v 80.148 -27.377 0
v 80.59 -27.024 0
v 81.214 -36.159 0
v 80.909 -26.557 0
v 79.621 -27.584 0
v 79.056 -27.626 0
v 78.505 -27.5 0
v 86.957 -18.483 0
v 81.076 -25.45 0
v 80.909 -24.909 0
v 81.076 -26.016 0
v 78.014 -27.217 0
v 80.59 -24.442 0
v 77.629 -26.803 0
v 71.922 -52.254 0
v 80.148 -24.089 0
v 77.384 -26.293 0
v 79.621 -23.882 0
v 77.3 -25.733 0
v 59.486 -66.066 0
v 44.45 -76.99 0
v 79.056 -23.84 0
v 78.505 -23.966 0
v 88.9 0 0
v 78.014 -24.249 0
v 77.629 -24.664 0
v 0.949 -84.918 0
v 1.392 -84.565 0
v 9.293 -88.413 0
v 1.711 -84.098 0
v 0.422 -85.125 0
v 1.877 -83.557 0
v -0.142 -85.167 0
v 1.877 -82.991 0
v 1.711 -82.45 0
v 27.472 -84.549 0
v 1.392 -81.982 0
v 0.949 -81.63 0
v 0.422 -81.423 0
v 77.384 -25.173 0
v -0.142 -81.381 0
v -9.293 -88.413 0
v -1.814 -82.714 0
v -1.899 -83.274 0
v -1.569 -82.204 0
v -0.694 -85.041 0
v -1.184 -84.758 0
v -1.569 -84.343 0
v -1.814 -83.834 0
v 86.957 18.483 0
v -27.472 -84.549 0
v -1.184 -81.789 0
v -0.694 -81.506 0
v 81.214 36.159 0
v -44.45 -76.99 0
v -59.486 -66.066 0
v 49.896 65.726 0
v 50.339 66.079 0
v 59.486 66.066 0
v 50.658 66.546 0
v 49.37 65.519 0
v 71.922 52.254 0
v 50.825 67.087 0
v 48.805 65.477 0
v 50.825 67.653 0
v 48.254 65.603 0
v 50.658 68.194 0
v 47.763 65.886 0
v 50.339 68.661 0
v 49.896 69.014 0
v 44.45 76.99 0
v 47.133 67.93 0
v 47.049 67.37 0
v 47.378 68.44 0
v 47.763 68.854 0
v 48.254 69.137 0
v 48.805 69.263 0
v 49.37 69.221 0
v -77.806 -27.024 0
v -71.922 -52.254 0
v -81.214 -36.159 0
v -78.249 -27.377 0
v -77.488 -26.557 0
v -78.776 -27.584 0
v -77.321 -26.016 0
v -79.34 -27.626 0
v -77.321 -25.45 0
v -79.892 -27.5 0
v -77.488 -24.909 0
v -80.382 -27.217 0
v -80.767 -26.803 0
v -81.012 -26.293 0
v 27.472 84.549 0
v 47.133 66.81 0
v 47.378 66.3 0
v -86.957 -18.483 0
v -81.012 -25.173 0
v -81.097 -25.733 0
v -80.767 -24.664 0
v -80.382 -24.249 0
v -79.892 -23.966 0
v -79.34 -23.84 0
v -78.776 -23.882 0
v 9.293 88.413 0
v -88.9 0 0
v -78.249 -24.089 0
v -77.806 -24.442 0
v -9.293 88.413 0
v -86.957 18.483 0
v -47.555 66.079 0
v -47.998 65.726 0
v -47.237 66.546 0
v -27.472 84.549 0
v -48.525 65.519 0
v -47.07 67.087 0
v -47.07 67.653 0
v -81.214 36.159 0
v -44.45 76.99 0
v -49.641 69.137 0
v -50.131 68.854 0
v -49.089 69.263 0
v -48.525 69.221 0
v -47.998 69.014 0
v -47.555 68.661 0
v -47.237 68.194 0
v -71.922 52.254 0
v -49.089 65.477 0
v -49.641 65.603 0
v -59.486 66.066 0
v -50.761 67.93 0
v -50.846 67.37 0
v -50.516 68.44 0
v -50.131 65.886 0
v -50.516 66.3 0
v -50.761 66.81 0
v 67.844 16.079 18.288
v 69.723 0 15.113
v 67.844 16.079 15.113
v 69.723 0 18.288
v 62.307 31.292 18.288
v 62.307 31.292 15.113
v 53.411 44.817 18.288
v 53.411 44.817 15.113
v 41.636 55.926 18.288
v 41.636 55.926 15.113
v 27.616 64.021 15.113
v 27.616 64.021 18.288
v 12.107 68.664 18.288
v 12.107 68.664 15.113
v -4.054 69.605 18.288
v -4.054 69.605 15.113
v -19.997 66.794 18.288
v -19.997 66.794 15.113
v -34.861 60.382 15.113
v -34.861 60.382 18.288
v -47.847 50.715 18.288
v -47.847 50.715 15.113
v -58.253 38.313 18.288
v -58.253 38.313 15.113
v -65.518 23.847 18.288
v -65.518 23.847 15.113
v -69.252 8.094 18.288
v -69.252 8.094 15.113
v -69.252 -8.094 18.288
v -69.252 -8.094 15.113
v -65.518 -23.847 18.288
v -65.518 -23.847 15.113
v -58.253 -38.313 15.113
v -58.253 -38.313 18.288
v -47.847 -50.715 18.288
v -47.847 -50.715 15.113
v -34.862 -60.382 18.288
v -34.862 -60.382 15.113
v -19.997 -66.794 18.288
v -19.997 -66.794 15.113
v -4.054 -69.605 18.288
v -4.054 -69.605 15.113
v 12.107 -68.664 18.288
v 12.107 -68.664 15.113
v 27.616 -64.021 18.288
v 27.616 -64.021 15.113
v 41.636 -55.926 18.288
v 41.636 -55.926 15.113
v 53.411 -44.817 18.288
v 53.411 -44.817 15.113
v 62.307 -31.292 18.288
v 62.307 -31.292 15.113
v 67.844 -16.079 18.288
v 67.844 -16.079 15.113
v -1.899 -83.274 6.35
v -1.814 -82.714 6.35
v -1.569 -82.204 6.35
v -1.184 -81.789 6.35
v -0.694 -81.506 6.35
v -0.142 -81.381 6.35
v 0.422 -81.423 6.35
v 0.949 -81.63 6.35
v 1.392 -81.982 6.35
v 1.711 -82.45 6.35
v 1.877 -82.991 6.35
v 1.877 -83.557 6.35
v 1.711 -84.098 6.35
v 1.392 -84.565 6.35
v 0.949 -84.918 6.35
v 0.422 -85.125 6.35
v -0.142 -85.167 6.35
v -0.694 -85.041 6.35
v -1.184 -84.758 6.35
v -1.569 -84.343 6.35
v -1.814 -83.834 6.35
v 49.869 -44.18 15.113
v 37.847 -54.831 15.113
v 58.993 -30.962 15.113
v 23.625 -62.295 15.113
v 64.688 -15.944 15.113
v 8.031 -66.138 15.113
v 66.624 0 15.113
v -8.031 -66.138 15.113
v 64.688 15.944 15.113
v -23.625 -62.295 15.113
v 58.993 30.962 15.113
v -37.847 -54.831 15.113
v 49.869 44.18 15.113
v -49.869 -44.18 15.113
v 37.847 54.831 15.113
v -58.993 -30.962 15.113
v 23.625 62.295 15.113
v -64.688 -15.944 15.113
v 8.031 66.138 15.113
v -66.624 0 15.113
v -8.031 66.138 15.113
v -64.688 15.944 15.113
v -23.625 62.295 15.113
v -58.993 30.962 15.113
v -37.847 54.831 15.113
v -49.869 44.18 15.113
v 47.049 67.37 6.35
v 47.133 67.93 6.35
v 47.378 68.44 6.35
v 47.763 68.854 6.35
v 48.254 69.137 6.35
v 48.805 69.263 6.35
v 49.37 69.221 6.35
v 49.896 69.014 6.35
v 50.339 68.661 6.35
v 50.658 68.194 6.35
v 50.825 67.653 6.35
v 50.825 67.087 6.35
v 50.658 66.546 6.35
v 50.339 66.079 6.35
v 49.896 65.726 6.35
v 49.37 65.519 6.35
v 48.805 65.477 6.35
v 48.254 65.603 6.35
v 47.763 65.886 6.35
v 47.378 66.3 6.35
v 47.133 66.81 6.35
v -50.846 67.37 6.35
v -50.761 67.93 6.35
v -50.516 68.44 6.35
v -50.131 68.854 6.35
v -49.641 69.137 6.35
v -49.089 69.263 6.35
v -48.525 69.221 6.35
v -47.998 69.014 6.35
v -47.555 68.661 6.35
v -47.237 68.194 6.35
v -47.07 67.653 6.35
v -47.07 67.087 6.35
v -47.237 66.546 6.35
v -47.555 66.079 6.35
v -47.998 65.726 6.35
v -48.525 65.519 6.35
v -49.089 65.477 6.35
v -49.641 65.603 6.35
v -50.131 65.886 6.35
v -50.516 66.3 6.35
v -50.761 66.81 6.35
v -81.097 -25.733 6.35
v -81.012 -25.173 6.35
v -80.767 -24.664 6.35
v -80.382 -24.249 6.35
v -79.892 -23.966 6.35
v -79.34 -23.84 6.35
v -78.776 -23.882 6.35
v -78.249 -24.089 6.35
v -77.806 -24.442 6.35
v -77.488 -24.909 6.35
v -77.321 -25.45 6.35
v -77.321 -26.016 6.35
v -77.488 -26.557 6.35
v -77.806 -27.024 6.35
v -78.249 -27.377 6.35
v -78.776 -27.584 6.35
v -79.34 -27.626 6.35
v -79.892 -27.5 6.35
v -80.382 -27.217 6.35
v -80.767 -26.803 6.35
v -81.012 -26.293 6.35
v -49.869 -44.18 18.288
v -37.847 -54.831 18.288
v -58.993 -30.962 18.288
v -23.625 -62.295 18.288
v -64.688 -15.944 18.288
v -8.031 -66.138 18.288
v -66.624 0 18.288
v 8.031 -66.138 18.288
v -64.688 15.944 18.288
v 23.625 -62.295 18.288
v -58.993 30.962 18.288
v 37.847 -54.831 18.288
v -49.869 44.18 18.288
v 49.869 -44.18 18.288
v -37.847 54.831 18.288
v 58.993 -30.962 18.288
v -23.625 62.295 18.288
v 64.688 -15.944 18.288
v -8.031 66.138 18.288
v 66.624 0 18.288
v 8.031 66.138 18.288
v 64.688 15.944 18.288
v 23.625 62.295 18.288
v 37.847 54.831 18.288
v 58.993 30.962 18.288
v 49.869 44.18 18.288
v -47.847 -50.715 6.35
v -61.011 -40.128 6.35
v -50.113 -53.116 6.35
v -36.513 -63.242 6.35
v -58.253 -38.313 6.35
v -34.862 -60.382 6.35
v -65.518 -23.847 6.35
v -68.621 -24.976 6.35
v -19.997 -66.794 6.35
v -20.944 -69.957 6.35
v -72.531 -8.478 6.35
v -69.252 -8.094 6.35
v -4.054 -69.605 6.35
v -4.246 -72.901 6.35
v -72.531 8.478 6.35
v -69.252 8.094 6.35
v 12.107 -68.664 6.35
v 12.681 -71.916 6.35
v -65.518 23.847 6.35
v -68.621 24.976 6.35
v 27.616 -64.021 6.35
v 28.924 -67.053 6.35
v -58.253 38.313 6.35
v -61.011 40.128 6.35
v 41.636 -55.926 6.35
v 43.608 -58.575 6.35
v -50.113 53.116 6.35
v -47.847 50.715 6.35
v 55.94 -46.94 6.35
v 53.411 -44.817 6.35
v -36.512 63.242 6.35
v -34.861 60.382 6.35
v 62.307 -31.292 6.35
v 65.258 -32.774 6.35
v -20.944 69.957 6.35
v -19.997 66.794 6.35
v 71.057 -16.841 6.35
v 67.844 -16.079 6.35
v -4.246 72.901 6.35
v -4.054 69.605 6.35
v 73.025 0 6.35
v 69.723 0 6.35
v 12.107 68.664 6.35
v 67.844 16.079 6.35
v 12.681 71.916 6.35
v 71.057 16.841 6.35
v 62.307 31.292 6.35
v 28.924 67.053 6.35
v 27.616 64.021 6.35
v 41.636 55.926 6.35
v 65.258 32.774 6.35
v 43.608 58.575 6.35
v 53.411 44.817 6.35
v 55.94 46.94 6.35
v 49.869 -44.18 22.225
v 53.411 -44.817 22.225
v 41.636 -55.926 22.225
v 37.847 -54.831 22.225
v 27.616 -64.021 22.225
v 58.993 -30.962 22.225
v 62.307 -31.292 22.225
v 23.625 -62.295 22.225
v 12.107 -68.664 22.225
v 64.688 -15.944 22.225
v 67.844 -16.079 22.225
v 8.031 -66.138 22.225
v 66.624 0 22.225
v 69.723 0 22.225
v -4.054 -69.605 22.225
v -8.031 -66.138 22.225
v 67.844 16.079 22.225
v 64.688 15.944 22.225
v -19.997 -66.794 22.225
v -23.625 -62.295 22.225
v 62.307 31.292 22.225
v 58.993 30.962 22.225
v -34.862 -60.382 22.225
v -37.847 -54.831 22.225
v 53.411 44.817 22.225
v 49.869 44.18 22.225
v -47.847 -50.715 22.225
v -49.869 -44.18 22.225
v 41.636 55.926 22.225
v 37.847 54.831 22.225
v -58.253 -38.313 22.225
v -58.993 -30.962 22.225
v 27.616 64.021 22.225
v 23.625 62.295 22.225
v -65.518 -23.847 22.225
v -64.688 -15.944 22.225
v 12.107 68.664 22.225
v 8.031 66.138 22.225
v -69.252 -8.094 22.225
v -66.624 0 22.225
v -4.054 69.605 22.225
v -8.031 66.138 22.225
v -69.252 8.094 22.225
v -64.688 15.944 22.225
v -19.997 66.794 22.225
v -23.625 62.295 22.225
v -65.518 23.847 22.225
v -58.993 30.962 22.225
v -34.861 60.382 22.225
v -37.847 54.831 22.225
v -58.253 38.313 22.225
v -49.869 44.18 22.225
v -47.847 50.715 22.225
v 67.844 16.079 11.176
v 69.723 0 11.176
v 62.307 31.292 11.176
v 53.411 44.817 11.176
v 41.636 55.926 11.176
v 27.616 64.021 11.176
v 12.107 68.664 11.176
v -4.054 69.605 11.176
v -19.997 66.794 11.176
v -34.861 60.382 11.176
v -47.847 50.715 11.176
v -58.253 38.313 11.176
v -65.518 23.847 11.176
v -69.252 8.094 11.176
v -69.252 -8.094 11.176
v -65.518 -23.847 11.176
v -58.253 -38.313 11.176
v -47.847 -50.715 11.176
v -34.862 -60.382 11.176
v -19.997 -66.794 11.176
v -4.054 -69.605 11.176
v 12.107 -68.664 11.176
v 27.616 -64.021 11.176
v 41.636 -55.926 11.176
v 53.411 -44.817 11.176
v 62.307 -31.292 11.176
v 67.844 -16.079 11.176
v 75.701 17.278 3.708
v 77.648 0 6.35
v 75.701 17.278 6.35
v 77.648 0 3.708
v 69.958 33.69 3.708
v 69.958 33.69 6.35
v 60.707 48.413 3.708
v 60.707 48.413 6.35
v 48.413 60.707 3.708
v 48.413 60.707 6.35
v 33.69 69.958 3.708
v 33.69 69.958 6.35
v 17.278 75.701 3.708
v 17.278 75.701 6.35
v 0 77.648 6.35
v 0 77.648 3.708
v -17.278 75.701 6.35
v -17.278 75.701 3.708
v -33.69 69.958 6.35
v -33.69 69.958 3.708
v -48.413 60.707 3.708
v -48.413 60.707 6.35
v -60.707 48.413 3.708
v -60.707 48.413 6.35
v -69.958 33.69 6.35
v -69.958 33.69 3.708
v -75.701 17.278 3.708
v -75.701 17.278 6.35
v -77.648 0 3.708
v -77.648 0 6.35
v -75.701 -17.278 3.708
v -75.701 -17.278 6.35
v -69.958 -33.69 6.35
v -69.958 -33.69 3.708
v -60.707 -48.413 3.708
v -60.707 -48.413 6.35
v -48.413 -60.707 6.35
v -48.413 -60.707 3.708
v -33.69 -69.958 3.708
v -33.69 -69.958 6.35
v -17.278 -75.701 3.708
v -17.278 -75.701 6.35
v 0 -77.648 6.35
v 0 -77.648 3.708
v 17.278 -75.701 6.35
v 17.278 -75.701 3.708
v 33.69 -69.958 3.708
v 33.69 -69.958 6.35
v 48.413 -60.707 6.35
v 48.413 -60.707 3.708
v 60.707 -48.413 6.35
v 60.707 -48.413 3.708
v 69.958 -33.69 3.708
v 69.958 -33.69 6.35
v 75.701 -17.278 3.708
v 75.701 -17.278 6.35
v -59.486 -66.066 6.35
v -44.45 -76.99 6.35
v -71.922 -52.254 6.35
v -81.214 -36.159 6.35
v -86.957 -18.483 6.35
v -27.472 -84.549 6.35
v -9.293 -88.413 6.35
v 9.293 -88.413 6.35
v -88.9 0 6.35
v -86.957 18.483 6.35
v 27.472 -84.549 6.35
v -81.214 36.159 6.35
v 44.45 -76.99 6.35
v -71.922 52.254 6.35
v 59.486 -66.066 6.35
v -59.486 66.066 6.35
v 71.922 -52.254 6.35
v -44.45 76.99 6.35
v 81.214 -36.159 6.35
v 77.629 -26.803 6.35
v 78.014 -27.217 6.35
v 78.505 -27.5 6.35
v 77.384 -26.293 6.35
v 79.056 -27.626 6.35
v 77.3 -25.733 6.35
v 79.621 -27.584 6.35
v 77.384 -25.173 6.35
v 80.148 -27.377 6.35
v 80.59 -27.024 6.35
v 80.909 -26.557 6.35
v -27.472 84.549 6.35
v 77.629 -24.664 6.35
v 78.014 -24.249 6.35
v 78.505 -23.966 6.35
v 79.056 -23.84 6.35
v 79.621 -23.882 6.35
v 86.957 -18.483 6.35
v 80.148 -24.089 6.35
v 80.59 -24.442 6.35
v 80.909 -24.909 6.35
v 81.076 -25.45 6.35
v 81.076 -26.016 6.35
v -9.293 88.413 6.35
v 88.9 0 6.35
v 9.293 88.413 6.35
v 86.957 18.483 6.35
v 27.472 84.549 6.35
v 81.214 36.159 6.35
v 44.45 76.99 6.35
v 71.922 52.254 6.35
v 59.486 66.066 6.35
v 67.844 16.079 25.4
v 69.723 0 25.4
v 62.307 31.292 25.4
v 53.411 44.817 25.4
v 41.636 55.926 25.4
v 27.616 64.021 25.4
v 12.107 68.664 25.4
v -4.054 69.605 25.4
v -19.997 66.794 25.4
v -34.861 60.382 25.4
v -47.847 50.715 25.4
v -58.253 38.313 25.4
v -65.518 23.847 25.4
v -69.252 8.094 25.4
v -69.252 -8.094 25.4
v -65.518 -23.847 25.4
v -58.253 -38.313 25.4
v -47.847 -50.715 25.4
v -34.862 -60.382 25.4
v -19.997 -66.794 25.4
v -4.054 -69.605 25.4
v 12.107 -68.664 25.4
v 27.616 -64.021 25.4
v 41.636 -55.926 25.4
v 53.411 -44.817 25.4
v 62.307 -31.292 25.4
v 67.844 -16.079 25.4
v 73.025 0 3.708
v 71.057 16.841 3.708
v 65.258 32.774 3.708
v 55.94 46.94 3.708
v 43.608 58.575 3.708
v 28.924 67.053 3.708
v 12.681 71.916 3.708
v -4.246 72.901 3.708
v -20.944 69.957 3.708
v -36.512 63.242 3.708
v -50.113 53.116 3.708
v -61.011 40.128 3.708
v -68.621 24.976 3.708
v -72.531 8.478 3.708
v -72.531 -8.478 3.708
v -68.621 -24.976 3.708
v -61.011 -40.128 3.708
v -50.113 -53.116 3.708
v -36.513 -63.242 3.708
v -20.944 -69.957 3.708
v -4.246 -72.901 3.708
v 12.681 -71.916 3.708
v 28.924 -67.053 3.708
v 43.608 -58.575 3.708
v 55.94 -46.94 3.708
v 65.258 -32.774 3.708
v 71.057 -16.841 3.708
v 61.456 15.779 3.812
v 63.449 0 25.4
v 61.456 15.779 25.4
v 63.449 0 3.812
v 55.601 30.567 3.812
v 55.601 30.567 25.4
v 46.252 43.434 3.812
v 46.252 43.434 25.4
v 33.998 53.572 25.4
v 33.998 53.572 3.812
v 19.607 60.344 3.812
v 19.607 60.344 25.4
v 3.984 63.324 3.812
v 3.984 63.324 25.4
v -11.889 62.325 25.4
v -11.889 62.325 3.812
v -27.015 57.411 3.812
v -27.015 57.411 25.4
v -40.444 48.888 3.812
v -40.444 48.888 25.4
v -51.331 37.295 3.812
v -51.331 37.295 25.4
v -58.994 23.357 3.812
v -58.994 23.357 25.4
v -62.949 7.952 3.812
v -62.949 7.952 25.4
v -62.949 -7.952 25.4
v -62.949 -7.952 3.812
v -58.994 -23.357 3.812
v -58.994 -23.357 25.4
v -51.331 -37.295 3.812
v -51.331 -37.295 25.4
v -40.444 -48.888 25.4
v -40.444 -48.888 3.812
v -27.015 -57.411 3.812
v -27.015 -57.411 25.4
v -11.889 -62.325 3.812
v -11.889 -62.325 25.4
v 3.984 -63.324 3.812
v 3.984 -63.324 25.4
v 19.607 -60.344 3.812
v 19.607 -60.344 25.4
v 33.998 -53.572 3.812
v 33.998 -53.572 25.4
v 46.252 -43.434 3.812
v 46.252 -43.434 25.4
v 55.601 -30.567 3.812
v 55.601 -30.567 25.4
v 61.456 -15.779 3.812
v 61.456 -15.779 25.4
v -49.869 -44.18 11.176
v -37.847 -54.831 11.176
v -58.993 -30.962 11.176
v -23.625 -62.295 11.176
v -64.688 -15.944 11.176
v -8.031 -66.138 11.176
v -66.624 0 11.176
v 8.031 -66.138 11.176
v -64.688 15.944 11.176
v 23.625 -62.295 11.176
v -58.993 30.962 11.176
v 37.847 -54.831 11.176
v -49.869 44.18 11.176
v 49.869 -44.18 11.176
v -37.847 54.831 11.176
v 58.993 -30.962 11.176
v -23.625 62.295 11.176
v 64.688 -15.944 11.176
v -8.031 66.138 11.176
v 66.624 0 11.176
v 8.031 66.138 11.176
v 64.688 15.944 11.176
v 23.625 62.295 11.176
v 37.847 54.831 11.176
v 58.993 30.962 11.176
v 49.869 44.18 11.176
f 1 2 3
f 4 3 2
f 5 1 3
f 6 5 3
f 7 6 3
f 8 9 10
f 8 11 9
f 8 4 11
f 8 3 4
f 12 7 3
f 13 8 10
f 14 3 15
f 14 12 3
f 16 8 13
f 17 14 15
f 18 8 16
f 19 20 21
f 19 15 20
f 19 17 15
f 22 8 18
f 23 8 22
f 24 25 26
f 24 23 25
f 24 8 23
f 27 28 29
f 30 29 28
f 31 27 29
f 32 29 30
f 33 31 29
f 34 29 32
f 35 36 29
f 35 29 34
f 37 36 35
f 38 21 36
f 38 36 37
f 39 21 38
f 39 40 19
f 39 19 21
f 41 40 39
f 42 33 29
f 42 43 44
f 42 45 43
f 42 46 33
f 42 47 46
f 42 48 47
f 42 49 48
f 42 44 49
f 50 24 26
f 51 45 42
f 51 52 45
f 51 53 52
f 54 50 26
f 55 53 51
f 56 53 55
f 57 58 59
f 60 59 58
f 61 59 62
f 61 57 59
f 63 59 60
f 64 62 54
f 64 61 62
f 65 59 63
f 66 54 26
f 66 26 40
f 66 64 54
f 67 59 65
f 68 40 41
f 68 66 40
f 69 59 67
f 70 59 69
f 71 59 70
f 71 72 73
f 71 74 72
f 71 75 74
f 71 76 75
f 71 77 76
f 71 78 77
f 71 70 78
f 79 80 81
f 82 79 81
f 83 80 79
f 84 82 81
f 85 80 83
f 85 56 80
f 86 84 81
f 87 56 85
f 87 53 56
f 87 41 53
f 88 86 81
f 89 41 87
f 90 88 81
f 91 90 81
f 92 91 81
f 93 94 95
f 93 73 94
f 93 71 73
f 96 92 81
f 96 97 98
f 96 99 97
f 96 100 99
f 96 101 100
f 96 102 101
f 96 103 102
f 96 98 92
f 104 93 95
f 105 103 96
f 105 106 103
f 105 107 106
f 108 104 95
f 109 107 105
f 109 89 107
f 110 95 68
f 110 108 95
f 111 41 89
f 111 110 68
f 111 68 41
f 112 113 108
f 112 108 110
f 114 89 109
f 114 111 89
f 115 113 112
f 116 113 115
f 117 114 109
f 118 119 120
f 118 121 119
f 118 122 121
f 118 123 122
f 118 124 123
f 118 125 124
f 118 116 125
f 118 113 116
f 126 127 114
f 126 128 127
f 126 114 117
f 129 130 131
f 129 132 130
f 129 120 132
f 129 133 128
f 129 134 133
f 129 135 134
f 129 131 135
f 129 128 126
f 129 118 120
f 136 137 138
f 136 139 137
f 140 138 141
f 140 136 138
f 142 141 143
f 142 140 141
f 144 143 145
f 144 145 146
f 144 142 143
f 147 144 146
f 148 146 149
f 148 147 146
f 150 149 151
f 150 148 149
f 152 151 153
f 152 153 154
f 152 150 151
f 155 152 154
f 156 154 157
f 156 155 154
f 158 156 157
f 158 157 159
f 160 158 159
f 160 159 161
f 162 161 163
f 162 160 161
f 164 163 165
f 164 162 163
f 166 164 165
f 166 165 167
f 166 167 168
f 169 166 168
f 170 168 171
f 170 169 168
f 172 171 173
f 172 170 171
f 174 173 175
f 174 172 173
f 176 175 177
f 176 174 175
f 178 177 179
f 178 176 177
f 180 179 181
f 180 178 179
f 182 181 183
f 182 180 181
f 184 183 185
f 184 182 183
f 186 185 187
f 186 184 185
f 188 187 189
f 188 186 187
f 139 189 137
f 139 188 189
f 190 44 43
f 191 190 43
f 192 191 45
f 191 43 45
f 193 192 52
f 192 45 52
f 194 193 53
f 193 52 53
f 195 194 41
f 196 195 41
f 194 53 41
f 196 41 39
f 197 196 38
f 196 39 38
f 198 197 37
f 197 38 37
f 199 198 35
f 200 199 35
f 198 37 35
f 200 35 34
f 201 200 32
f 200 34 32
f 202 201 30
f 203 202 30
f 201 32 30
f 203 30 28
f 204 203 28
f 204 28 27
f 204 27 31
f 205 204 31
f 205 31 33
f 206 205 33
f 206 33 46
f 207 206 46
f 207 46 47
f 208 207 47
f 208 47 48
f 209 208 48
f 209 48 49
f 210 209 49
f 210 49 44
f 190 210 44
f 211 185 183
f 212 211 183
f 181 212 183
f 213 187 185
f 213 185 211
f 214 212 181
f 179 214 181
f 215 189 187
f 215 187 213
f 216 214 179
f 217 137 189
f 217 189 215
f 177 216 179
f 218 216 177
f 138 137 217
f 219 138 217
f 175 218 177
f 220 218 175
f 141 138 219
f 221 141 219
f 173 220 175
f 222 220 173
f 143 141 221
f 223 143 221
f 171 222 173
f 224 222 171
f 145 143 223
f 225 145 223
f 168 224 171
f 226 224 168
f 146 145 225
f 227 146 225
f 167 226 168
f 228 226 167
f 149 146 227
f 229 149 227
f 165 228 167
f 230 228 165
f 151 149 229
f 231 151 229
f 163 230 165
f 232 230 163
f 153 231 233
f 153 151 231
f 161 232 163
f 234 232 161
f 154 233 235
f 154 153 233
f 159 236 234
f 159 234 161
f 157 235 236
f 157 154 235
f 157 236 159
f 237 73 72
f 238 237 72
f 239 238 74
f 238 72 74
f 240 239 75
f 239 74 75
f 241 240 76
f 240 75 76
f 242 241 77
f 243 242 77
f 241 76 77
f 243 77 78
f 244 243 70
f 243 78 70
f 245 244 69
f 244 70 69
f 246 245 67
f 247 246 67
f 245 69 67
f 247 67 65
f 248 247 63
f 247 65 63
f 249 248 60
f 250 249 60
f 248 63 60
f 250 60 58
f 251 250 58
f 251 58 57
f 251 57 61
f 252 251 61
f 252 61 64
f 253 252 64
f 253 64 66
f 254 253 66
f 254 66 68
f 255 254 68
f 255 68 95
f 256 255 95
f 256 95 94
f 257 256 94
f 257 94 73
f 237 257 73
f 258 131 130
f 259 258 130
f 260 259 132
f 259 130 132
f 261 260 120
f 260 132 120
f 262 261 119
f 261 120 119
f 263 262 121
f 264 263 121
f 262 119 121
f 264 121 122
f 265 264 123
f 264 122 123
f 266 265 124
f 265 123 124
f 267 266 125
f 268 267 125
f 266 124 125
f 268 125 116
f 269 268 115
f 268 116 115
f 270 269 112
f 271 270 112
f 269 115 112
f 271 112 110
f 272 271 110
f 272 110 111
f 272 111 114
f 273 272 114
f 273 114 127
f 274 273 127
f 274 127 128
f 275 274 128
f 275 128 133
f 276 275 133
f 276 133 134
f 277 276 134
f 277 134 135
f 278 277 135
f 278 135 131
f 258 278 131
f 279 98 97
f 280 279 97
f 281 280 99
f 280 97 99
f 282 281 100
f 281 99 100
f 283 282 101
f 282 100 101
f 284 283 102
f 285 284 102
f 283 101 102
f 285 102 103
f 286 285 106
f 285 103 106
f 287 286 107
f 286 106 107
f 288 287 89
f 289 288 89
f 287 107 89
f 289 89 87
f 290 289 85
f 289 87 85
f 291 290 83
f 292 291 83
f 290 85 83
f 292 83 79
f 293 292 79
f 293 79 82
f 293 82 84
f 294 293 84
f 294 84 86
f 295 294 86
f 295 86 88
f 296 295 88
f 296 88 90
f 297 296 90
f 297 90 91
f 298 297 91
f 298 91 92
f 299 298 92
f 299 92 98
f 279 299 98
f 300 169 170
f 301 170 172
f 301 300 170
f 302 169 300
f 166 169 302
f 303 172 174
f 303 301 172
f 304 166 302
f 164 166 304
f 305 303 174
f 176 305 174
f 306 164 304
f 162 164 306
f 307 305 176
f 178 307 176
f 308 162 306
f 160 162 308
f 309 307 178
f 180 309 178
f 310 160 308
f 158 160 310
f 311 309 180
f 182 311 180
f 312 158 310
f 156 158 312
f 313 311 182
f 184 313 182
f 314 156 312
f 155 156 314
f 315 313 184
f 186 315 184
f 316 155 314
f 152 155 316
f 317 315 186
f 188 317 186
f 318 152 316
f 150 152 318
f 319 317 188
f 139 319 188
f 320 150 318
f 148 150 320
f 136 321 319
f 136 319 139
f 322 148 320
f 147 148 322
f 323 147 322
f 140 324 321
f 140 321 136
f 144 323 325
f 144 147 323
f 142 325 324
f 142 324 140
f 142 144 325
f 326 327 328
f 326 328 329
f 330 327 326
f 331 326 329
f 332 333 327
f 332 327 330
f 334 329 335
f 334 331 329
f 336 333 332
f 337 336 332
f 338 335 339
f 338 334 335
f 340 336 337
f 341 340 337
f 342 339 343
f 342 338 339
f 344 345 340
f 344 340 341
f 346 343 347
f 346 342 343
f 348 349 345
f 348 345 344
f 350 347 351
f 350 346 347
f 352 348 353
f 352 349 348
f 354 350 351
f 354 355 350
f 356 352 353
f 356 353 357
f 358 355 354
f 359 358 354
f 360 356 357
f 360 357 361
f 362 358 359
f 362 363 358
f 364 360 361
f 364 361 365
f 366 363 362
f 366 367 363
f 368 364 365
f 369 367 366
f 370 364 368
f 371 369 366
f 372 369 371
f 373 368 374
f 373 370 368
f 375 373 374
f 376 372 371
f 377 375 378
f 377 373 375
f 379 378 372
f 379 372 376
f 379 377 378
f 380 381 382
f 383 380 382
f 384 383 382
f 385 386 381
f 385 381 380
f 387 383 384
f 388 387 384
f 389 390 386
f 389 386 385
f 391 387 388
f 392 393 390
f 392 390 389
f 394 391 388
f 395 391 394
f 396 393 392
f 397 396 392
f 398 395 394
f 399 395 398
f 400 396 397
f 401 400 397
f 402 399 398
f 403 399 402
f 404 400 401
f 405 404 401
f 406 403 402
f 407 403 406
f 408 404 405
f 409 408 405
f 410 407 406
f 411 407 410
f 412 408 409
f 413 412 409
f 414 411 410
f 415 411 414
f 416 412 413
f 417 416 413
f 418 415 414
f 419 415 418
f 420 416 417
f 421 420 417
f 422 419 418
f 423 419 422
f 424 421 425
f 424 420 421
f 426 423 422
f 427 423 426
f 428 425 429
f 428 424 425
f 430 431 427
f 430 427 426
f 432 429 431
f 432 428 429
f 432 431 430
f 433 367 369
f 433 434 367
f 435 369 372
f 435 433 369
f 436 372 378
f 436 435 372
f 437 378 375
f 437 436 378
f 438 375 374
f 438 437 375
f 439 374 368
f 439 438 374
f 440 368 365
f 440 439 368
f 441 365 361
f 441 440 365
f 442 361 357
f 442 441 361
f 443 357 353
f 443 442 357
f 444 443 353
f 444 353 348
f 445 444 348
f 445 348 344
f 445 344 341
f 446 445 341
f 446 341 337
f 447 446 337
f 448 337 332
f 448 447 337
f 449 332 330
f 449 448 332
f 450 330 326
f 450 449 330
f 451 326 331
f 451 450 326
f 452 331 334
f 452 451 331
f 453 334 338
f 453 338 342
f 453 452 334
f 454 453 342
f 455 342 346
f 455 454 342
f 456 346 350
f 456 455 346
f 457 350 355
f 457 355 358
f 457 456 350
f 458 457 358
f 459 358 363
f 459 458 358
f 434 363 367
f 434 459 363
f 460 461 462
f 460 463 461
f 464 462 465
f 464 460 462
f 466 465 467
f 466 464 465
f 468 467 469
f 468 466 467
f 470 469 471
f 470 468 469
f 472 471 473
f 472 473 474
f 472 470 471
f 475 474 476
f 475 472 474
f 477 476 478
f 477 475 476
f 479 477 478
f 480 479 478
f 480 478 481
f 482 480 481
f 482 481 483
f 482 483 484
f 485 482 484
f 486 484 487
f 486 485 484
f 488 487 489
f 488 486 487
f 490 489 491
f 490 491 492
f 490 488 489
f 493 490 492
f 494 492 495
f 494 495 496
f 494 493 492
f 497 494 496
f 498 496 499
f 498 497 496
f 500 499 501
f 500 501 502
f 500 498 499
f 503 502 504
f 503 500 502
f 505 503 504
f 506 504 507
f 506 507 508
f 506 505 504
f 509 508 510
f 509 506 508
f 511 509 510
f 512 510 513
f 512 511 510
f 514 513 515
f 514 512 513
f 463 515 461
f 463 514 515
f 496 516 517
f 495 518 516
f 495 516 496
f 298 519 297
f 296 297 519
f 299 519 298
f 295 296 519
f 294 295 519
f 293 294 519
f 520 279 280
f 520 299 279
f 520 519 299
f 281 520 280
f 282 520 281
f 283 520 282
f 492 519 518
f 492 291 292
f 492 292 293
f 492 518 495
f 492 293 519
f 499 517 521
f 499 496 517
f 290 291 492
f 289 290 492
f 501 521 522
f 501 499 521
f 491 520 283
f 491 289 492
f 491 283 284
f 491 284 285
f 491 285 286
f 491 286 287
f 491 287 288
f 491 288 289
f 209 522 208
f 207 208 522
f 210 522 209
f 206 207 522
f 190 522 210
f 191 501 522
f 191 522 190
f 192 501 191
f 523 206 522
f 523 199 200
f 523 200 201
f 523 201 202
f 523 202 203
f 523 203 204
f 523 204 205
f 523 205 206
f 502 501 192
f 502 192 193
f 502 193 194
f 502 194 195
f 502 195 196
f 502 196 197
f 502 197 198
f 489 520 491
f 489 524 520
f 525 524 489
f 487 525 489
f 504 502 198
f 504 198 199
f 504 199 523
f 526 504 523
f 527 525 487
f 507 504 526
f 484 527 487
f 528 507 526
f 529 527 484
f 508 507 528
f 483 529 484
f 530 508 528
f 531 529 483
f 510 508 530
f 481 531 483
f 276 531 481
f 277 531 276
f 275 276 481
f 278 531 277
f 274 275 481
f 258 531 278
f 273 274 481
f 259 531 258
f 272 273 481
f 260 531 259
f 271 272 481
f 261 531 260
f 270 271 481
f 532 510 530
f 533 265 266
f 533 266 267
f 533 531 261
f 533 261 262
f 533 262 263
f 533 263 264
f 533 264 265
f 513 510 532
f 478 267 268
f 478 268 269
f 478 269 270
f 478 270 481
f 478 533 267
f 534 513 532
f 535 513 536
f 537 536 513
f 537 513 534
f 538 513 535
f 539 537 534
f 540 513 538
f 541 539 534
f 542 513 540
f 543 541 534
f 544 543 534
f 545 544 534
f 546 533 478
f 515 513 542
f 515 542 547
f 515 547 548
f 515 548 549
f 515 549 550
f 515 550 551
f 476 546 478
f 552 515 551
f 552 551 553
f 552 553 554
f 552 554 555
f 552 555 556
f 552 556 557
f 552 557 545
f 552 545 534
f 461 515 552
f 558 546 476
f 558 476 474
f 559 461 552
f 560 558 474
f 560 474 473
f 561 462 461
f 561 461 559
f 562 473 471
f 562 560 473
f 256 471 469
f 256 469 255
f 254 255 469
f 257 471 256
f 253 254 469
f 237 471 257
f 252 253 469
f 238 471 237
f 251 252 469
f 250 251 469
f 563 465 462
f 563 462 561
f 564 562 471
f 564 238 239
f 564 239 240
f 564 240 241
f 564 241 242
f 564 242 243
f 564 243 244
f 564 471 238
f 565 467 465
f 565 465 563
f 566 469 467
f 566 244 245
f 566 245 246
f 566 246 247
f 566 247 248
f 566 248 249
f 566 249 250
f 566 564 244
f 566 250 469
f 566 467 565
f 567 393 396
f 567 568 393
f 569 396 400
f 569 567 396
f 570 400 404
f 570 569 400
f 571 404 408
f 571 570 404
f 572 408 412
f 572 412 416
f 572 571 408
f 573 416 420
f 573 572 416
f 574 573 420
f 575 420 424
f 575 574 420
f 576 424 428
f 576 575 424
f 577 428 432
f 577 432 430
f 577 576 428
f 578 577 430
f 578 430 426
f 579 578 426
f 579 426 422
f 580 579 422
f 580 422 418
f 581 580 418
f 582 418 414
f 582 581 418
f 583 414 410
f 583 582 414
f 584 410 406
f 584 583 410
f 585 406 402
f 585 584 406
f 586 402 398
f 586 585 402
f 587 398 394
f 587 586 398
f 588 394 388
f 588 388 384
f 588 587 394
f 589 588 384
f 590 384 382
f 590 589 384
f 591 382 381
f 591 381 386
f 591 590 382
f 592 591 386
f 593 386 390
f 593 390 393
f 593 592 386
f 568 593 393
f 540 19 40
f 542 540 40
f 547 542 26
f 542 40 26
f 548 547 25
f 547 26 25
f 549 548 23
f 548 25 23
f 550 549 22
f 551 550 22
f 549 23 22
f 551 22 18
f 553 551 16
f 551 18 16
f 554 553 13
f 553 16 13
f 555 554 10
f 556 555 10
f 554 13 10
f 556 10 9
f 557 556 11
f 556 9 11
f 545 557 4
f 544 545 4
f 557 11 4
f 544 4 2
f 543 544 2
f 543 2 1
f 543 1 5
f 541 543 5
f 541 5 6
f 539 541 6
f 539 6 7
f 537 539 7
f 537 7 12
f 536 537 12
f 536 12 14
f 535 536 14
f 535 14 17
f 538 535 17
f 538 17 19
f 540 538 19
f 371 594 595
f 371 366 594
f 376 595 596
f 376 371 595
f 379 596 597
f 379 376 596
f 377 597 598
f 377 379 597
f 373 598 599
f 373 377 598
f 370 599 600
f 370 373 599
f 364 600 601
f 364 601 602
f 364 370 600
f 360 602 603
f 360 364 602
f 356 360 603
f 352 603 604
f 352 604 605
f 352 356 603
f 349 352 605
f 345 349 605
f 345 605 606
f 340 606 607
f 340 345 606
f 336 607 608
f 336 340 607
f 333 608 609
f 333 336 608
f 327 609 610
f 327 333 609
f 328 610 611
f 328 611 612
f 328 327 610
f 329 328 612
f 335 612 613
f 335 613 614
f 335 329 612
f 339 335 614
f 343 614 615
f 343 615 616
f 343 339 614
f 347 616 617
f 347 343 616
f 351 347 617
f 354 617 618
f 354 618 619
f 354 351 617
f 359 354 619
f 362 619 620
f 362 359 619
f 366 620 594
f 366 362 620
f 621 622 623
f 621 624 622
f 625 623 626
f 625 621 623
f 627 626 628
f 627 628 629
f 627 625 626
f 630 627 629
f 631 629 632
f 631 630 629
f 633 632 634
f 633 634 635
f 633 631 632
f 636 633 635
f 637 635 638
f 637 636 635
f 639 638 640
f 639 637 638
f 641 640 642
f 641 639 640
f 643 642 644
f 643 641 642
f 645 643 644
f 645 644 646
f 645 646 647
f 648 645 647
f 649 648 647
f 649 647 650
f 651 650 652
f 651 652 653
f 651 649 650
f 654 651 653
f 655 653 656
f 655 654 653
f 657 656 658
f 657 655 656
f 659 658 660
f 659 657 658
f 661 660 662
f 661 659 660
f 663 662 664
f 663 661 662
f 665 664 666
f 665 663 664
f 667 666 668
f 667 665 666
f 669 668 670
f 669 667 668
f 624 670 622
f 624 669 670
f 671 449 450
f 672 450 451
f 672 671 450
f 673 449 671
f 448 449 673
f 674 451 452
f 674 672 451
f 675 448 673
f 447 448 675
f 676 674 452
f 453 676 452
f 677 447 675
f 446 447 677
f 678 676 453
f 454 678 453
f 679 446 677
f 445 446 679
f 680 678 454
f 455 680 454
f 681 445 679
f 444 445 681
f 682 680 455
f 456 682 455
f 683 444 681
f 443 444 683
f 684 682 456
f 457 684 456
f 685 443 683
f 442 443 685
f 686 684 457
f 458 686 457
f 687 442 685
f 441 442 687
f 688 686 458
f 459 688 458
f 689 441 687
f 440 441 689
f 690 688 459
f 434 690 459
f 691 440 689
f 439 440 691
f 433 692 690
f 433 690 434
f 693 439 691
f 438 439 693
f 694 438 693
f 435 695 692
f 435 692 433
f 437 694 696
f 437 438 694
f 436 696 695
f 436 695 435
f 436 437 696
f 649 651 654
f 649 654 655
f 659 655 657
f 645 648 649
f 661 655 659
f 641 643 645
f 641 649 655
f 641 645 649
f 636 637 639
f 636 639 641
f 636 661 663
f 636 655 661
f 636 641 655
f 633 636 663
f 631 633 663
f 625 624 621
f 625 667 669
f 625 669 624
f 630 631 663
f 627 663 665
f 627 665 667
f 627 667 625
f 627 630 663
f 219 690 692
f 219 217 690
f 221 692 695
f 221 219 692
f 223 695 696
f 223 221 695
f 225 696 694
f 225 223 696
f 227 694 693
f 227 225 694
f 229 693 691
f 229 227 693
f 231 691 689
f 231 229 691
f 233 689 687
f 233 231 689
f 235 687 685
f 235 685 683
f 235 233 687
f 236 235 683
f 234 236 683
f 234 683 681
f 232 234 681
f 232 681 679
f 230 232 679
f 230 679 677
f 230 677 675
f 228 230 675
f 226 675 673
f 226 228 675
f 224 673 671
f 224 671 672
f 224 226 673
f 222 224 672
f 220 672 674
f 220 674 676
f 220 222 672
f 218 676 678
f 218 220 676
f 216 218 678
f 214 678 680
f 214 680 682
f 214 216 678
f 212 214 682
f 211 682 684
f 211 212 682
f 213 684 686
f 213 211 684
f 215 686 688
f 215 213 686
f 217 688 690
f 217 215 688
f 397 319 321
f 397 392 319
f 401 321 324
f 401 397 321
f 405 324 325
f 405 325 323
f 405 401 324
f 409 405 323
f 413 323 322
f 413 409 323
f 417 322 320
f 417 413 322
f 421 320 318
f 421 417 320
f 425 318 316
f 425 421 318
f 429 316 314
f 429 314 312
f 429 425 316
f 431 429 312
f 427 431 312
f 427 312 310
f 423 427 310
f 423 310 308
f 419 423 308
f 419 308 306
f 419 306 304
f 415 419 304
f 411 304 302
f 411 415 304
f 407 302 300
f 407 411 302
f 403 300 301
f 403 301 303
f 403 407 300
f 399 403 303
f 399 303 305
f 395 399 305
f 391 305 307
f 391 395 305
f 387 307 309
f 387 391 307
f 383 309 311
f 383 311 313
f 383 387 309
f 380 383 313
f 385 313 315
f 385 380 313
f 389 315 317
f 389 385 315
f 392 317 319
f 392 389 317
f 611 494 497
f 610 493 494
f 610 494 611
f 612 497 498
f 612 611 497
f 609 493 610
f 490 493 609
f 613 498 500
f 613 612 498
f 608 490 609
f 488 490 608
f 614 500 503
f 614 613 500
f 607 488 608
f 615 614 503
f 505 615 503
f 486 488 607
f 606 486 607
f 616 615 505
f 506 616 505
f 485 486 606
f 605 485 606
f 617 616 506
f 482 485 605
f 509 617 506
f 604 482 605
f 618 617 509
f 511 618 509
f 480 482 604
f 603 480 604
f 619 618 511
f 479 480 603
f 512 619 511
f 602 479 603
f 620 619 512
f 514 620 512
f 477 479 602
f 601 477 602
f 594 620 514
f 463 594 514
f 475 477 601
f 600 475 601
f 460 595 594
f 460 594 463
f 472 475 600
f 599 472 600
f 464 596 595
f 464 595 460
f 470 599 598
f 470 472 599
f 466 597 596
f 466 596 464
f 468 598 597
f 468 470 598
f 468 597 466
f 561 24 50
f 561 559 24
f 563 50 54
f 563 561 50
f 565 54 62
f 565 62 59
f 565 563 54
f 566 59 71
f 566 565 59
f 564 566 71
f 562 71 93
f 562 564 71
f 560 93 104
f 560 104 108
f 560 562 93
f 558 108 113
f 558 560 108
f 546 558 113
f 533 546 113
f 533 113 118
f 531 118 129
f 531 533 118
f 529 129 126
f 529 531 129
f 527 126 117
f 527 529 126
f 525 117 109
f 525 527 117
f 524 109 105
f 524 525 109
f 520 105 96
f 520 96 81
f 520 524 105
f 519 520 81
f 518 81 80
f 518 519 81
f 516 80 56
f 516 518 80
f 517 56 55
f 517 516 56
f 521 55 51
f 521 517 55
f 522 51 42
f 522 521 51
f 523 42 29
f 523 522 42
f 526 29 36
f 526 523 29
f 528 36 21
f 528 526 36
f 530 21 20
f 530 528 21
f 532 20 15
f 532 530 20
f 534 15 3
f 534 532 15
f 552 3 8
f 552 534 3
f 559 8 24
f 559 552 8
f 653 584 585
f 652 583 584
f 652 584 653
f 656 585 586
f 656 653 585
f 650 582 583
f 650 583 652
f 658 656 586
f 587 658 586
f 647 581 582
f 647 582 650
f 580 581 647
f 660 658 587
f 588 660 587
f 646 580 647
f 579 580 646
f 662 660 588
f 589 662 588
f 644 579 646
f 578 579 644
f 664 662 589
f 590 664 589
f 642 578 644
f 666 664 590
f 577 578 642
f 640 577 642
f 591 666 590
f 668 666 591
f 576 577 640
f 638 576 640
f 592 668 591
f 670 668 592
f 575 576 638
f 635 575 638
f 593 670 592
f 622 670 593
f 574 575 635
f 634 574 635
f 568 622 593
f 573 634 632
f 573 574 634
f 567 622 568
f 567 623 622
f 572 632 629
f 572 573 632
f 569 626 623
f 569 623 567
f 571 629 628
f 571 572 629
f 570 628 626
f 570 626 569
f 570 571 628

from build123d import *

# Parameters (mm, degrees)
F_6_CLEARANCE_HOLE1_D     = 3.7973
F_6_CLEARANCE_HOLE1_DEPTH = 25.4
F_6_CLEARANCE_HOLE1_TIP   = 1.140824014


with BuildPart() as part:
    # Sketch1 → Revolve1 (revolve)
    with BuildSketch(Plane(origin=(0, 0, 0), x_dir=(1, 0, 0), z_dir=(0, 1, 0))):
        Polygon((0, 0), (88.9, 0), (88.9, -6.35), (77.6478, -6.35), (77.6478, -3.7084), (73.025, -3.7084), (73.025, -6.35), (69.723, -6.35), (69.723, -11.176), (66.6242, -11.176), (66.6242, -15.113), (69.723, -15.113), (69.723, -18.288), (66.6242, -18.288), (66.6242, -22.225), (69.723, -22.225), (69.723, -25.4), (63.4492, -25.4), (63.4492, -3.811809937), (0, -3.811809937), align=None)
    revolve(axis=Axis((0, 0, 0), (0, 0, 1)))

    # #6 Clearance Hole1
    with Locations(Plane.XY.offset(6.35)):
        with Locations((0, -83.2739), (79.198185232, -25.733050288), (48.947170321, 67.370000288), (-79.198185232, -25.733050288), (-48.947170321, 67.370000288)):
            Hole(F_6_CLEARANCE_HOLE1_D / 2, depth=F_6_CLEARANCE_HOLE1_DEPTH)
            with Locations((0, 0, -(F_6_CLEARANCE_HOLE1_DEPTH + F_6_CLEARANCE_HOLE1_TIP / 2))):  # 118° drill point
                Cone(0, F_6_CLEARANCE_HOLE1_D / 2, F_6_CLEARANCE_HOLE1_TIP, mode=Mode.SUBTRACT)


solid = part.part
